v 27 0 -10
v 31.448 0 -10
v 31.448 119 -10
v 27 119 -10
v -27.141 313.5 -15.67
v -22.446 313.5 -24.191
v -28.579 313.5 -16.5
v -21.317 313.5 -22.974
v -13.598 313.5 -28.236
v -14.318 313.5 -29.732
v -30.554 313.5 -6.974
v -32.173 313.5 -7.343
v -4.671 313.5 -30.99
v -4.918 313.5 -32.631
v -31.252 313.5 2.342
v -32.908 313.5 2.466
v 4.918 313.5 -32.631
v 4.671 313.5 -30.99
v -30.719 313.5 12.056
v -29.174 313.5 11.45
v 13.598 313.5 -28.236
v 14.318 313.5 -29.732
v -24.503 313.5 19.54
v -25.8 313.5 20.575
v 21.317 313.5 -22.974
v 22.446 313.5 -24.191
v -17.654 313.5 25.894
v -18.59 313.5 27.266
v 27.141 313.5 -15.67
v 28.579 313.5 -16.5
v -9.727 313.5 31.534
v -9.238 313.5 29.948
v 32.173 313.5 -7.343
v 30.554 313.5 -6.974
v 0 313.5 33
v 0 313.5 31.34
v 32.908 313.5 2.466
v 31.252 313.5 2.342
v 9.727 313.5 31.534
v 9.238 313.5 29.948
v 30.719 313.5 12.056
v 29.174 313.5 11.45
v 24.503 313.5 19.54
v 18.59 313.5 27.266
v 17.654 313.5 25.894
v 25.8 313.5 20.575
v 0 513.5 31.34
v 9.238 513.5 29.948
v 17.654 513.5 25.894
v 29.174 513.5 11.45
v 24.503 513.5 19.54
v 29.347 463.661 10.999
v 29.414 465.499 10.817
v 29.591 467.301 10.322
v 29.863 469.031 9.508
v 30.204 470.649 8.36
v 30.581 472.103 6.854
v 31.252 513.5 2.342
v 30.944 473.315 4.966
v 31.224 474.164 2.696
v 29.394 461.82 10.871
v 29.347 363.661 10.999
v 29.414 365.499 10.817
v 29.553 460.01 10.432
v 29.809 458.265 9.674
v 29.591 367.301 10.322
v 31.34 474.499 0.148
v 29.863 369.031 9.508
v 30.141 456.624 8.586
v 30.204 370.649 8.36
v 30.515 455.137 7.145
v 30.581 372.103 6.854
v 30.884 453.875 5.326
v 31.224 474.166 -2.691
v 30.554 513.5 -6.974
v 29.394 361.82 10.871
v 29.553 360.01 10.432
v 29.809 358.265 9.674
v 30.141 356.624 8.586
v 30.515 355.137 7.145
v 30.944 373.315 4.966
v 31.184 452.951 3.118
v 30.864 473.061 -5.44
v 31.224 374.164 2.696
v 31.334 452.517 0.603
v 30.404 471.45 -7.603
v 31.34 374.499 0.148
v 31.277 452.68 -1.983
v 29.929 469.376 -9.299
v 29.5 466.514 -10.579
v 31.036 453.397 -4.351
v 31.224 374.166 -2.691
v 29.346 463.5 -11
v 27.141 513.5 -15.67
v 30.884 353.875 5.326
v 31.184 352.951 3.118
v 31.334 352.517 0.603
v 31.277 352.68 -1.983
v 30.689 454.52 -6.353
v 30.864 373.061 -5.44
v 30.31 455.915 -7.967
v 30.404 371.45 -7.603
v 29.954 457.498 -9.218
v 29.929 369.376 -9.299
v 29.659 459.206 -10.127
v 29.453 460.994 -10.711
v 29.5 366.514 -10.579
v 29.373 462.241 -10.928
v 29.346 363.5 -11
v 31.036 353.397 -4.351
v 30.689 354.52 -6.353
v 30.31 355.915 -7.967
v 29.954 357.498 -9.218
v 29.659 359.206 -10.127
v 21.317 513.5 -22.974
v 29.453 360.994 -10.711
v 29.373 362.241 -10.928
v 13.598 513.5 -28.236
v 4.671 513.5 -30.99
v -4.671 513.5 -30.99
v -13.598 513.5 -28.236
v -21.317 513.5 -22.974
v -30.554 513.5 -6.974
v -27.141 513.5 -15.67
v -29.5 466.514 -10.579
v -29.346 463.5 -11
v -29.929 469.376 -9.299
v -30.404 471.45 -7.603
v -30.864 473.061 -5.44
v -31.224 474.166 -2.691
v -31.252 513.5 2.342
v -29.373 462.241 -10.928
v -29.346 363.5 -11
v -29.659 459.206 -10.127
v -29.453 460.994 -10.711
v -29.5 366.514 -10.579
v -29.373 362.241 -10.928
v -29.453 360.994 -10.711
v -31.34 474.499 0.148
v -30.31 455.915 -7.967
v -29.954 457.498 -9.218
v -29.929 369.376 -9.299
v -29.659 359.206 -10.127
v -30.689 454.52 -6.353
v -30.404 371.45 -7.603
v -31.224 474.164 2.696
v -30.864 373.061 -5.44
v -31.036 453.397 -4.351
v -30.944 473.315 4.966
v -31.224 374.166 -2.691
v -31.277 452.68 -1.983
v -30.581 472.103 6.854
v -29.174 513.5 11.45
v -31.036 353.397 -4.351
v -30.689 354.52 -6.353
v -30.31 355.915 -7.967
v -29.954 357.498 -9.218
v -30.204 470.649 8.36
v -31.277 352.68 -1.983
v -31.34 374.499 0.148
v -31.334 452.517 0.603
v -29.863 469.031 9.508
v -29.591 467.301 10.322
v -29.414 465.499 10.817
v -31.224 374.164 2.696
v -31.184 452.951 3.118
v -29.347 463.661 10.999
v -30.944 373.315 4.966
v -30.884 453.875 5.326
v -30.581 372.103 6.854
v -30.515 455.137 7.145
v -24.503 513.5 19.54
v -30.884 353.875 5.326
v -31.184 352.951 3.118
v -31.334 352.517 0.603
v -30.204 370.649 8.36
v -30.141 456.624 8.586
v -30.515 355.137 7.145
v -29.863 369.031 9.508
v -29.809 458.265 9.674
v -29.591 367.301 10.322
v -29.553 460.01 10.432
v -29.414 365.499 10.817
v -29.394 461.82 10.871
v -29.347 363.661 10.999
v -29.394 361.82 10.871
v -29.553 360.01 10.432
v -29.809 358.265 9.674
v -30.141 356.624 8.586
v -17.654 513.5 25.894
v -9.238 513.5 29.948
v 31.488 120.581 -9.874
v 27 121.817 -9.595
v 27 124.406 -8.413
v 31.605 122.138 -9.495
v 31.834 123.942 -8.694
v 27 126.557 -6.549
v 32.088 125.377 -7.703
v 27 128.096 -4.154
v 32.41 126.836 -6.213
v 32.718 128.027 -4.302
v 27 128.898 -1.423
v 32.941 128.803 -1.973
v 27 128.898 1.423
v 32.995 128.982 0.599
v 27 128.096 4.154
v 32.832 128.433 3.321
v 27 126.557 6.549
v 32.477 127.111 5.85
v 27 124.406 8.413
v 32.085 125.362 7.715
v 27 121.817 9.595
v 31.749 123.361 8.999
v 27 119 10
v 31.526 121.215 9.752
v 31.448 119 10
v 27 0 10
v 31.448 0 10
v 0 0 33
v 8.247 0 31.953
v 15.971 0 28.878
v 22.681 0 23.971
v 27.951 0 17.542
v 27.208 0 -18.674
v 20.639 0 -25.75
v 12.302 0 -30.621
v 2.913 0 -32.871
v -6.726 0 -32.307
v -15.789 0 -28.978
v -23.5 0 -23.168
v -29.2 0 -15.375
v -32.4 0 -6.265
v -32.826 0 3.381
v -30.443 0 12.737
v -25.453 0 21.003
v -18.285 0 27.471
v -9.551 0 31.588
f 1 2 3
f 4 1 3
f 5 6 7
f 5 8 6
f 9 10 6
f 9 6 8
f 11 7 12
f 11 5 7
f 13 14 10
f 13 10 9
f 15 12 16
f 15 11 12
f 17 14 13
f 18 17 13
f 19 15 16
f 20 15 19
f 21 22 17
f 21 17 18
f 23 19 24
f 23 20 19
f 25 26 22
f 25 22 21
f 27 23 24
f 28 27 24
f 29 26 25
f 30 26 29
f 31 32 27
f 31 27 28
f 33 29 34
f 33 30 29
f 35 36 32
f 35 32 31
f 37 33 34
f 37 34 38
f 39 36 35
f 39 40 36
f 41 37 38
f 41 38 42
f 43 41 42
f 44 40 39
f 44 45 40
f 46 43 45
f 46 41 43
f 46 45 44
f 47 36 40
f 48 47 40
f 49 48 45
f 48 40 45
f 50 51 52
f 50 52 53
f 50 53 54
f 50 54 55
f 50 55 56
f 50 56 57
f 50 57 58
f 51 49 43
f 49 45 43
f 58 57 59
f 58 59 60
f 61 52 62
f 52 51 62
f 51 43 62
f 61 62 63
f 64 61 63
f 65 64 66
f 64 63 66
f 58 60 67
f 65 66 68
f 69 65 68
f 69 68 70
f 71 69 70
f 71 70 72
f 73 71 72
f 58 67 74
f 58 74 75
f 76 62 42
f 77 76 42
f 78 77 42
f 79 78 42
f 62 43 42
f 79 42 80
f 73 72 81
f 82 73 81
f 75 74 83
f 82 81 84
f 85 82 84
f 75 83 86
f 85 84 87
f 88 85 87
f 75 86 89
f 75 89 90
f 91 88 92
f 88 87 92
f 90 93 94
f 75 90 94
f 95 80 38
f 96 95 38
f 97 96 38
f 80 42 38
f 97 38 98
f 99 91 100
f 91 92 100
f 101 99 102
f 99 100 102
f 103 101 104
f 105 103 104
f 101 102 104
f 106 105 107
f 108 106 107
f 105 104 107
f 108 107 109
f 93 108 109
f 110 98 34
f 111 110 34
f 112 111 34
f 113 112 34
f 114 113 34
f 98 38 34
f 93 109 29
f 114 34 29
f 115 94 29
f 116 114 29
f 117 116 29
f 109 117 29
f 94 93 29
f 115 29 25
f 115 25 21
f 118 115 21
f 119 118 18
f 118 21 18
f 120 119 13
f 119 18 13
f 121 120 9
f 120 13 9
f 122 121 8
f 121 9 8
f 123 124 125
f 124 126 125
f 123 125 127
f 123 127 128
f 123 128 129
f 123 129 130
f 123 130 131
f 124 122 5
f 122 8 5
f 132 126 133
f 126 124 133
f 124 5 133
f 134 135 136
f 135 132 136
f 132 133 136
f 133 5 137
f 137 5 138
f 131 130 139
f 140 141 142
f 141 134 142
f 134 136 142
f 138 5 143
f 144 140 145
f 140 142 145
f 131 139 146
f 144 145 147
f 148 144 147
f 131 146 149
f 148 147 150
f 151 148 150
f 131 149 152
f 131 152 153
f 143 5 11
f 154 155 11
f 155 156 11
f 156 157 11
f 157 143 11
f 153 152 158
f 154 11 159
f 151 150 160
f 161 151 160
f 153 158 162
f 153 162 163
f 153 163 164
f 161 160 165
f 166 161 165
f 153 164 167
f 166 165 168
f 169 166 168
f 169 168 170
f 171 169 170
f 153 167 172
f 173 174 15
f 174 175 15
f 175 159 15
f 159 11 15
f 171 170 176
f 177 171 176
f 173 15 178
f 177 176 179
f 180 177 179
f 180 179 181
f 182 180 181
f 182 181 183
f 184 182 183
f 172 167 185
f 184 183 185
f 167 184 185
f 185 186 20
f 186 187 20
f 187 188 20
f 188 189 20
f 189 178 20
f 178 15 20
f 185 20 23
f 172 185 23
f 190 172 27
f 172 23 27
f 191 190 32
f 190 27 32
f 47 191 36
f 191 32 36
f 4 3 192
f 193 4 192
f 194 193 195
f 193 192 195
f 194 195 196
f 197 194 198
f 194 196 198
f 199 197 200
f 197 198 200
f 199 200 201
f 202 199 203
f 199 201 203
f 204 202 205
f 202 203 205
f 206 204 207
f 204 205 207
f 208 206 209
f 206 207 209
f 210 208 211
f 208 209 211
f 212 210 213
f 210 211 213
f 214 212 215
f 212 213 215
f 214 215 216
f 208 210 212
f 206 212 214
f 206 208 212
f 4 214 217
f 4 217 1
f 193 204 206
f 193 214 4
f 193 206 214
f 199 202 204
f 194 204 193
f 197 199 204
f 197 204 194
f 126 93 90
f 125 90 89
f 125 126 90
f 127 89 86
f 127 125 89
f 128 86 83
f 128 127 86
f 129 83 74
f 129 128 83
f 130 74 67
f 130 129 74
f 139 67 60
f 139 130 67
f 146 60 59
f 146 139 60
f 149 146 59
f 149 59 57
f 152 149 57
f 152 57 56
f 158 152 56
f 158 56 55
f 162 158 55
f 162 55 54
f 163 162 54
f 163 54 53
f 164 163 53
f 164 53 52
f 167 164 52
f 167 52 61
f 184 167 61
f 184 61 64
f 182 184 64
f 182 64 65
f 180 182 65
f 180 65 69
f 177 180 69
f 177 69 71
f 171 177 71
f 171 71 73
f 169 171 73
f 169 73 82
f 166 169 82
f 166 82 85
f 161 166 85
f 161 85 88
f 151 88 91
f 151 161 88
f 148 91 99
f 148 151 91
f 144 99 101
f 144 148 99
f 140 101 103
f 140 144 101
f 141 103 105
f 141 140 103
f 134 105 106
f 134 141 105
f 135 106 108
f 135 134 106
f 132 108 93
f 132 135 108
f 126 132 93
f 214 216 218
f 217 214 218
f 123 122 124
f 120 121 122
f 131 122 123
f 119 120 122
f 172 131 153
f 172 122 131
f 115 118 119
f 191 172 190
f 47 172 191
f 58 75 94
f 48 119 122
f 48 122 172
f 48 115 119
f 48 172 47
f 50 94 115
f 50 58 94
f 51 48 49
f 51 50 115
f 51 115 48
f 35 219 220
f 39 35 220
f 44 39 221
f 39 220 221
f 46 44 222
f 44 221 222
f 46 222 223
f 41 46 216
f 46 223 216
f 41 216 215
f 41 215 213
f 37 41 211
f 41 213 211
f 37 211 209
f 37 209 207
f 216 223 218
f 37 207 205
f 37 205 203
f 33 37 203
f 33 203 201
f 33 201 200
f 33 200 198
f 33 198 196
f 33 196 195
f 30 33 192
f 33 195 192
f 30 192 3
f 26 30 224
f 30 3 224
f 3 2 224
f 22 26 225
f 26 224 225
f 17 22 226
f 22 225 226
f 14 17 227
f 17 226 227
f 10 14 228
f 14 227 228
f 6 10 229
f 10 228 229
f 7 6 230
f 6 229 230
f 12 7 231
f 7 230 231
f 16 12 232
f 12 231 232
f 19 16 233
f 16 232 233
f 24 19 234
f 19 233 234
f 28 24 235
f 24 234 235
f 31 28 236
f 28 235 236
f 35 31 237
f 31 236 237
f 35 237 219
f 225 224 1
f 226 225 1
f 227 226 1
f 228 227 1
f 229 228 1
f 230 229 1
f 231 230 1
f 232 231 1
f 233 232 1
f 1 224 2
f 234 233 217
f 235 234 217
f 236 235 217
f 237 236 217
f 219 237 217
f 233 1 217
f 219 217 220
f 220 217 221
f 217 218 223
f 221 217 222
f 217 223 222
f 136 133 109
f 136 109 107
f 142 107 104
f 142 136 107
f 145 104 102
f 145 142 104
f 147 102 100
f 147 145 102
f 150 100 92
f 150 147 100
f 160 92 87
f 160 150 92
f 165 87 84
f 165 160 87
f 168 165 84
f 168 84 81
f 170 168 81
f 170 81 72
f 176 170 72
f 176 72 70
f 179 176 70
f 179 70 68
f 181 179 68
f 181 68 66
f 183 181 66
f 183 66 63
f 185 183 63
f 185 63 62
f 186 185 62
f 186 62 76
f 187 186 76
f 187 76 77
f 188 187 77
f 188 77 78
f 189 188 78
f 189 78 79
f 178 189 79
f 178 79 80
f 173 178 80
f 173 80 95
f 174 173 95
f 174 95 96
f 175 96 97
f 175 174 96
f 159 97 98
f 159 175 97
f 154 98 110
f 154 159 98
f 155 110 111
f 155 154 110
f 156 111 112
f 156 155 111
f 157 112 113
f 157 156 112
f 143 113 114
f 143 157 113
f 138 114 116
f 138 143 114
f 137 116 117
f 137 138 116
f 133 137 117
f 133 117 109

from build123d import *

# Parameters (mm, degrees)
SKETCH1_R               = 33
BOSS_EXTRUDE1_DEPTH     = 313.5
SKETCH2_R               = 31.34
BOSS_EXTRUDE2_DEPTH     = 200
CUT_EXTRUDE1_DEPTH      = 6
CUT_EXTRUDE2_DEPTH      = 516.616378729
CUT_EXTRUDE2_DEPTH_BACK = 516.616378729
SKETCH5_R               = 11


with BuildPart() as part:
    # Sketch1 → Boss-Extrude1 (new body)
    with BuildSketch(Plane(origin=(0, 0, 0), x_dir=(1, 0, 0), z_dir=(0, 1, 0))):
        with Locations(Location((0, 0, 0), (0, 0, 270))):
            Circle(SKETCH1_R)
    extrude(amount=BOSS_EXTRUDE1_DEPTH)

    # Sketch2 → Boss-Extrude2 (add)
    with BuildSketch(Plane(origin=(0, 313.5, 0), x_dir=(1, 0, 0), z_dir=(0, 1, 0))):
        with Locations(Location((0, 0, 0), (0, 0, 270))):
            Circle(SKETCH2_R)
    extrude(amount=BOSS_EXTRUDE2_DEPTH)

    # Sketch3 → Cut-Extrude1 (cut)
    with BuildSketch(Plane(origin=(33, 0, 0), x_dir=(0, 0, -1), z_dir=(1, 0, 0))):
        with BuildLine():
            Line((-10, 119), (-10, 0))
            Line((-10, 0), (10, 0))
            Line((10, 0), (10, 119))
            ThreePointArc((10, 119), (0, 129), (-10, 119))
        make_face()
    extrude(amount=-CUT_EXTRUDE1_DEPTH, mode=Mode.SUBTRACT)

    # Sketch5 → Cut-Extrude2 (cut, two sides: drawn at the far end of the back side and taken through both)
    with BuildSketch(Plane(origin=(0, 0, 0), x_dir=(0, 0, -1), z_dir=(1, 0, 0)).offset(-CUT_EXTRUDE2_DEPTH_BACK)):
        with Locations((0, 463.5)):
            Circle(SKETCH5_R)
        with Locations((0, 363.5)):
            Circle(SKETCH5_R)
    extrude(amount=CUT_EXTRUDE2_DEPTH + CUT_EXTRUDE2_DEPTH_BACK, mode=Mode.SUBTRACT)


solid = part.part
